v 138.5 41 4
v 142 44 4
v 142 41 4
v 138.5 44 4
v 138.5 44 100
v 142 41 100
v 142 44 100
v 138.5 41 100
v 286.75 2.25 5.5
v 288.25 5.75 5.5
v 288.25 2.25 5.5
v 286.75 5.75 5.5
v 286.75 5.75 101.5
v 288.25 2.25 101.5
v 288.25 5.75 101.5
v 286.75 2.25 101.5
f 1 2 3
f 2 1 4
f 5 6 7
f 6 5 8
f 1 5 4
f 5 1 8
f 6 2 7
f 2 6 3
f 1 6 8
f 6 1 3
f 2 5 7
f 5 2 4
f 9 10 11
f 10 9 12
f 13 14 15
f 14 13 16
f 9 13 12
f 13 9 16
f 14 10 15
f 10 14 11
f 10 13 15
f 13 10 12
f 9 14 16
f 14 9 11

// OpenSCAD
// file: stair.scad
include <foundation.scad>

module stringer(run,steps) {
  tread_width = 10.5;
  tread_rise = 7;
  stringer_angle = 33.7;
  rotate([0,stringer_angle,0])
    difference(){
      difference(){
        difference(){
          cube([run,1.5,12]);
          translate([0,-3,0])
            rotate([0,-stringer_angle,0])
            cube([tread_width+12,6,tread_width+3]);
        }
        translate([-1,-2,0])
          rotate([0,90-stringer_angle,0])
          cube([tread_rise,6,tread_width]);
      }
      for(i = [1:1:steps])
        translate([22+(i-1)*12.5,-2,6])              
          rotate([0,-stringer_angle,0])
          union(){
          cube([tread_width,6,tread_width+3]);
          cube([tread_width,6,tread_rise]);
        }
    }
}


module stairs() {
  translate([ft(9.25),5.5,slab_thk+ft(8.75)])
    stringer(ft(13.5),12);
  translate([ft(9.25),5.5+ft(3)+1,slab_thk+ft(8.75)])
    stringer(ft(13.5),12);
  
  
  NE()
    translate([-5.5,-5.5+ft(2)+1.5,ft(2)+1.5])
    rotate([0,0,90])
    stringer(ft(4),3);
  
  NE()
    translate([-4-ft(3),-5.5+ft(2)+1.5,ft(2)+1.5])
    rotate([0,0,90])
    stringer(ft(4),3);
  
  
  NE()
    translate([-ft(3)-5.5,5.5,ft(2)+1.5])
    cube([ft(3),ft(3),0.75]);
}
// file: TJI.scad
include <foundation.scad>


HORIZONTAL_NORTH=0;
HORIZONTAL_WEST=1;
VERTICAL_NORTH=2;
VERTICAL_WEST=3;

module tji_rim_board(length,orientation){

  w=1.5;
  h=11+7/8;
  
  if( orientation == HORIZONTAL_NORTH ){
    translate([0,0,slab_thk])
      versa_lam()
      cube([length,w,h]);
  }
  if( orientation == HORIZONTAL_WEST ){
    translate([w,0,slab_thk])
      rotate([0,0,90])
      versa_lam()
      cube([length,w,h]);
  }
  if( orientation == VERTICAL_NORTH ){
    translate([0,0,slab_thk+thk])
      rotate([0,-90,0])
      versa_lam()
        cube([length,w,h]);
  }
  if( orientation == VERTICAL_WEST ){
    translate([0,0,slab_thk])
      rotate([0,-90,-90])
      versa_lam()
        cube([length,w,h]);
  }
  
}


module TJI_230(length, orientation){
  web=3/8;
  height=11+7/8;
 
  w=2+5/16;
  h=1+3/8;
  
  if( orientation == HORIZONTAL_NORTH ){
    translate([0,0,slab_thk])
    union(){
      cube([length,w,h]);
      translate([0,w/2,0])
        cube([length,web,height]);
      translate([0,0,height-h])
        cube([length,w,h]);
    }
  }
  if( orientation == HORIZONTAL_WEST ){
      translate([w,0,slab_thk])
        rotate([0,0,90])
    union(){
      cube([length,w,h]);
      translate([0,w/2,0])
        cube([length,web,height]);
      translate([0,0,height-h])
        cube([length,w,h]);
    }
  }
}

module TJI_560(length, orientation){
  web=3/8;
  height=11+7/8;
 
  w=2+5/16;
  h=1+3/8;

  if( orientation == HORIZONTAL_NORTH ){
    translate([0,0,slab_thk])
    union(){
      cube([length,w,h]);
      translate([0,w/2,0])
        cube([length,web,height]);
      translate([0,0,height-h])
        cube([length,w,h]);
    }
  }
  if( orientation == HORIZONTAL_WEST ){
      translate([w,0,slab_thk])
        rotate([0,0,90])
    union(){
      cube([length,w,h]);
      translate([0,w/2,0])
        cube([length,web,height]);
      translate([0,0,height-h])
        cube([length,w,h]);
    }
  }
}
// main file
include <framing.scad>

module living_room_post(){
  SE()
    translate([ft(11)+8.5,ft(3)+5,0])
    post(3.5,3,ft(8),VERTICAL_NORTH);
}
module stair_framing(){
  NE()
    //translate([-ft(3)+7,ft(3)+6.5,0])
    interior_stud(ft(8),VERTICAL_NORTH);
}




module interior_framing(){
  living_room_post();
  stair_framing();
}

interior_framing();
